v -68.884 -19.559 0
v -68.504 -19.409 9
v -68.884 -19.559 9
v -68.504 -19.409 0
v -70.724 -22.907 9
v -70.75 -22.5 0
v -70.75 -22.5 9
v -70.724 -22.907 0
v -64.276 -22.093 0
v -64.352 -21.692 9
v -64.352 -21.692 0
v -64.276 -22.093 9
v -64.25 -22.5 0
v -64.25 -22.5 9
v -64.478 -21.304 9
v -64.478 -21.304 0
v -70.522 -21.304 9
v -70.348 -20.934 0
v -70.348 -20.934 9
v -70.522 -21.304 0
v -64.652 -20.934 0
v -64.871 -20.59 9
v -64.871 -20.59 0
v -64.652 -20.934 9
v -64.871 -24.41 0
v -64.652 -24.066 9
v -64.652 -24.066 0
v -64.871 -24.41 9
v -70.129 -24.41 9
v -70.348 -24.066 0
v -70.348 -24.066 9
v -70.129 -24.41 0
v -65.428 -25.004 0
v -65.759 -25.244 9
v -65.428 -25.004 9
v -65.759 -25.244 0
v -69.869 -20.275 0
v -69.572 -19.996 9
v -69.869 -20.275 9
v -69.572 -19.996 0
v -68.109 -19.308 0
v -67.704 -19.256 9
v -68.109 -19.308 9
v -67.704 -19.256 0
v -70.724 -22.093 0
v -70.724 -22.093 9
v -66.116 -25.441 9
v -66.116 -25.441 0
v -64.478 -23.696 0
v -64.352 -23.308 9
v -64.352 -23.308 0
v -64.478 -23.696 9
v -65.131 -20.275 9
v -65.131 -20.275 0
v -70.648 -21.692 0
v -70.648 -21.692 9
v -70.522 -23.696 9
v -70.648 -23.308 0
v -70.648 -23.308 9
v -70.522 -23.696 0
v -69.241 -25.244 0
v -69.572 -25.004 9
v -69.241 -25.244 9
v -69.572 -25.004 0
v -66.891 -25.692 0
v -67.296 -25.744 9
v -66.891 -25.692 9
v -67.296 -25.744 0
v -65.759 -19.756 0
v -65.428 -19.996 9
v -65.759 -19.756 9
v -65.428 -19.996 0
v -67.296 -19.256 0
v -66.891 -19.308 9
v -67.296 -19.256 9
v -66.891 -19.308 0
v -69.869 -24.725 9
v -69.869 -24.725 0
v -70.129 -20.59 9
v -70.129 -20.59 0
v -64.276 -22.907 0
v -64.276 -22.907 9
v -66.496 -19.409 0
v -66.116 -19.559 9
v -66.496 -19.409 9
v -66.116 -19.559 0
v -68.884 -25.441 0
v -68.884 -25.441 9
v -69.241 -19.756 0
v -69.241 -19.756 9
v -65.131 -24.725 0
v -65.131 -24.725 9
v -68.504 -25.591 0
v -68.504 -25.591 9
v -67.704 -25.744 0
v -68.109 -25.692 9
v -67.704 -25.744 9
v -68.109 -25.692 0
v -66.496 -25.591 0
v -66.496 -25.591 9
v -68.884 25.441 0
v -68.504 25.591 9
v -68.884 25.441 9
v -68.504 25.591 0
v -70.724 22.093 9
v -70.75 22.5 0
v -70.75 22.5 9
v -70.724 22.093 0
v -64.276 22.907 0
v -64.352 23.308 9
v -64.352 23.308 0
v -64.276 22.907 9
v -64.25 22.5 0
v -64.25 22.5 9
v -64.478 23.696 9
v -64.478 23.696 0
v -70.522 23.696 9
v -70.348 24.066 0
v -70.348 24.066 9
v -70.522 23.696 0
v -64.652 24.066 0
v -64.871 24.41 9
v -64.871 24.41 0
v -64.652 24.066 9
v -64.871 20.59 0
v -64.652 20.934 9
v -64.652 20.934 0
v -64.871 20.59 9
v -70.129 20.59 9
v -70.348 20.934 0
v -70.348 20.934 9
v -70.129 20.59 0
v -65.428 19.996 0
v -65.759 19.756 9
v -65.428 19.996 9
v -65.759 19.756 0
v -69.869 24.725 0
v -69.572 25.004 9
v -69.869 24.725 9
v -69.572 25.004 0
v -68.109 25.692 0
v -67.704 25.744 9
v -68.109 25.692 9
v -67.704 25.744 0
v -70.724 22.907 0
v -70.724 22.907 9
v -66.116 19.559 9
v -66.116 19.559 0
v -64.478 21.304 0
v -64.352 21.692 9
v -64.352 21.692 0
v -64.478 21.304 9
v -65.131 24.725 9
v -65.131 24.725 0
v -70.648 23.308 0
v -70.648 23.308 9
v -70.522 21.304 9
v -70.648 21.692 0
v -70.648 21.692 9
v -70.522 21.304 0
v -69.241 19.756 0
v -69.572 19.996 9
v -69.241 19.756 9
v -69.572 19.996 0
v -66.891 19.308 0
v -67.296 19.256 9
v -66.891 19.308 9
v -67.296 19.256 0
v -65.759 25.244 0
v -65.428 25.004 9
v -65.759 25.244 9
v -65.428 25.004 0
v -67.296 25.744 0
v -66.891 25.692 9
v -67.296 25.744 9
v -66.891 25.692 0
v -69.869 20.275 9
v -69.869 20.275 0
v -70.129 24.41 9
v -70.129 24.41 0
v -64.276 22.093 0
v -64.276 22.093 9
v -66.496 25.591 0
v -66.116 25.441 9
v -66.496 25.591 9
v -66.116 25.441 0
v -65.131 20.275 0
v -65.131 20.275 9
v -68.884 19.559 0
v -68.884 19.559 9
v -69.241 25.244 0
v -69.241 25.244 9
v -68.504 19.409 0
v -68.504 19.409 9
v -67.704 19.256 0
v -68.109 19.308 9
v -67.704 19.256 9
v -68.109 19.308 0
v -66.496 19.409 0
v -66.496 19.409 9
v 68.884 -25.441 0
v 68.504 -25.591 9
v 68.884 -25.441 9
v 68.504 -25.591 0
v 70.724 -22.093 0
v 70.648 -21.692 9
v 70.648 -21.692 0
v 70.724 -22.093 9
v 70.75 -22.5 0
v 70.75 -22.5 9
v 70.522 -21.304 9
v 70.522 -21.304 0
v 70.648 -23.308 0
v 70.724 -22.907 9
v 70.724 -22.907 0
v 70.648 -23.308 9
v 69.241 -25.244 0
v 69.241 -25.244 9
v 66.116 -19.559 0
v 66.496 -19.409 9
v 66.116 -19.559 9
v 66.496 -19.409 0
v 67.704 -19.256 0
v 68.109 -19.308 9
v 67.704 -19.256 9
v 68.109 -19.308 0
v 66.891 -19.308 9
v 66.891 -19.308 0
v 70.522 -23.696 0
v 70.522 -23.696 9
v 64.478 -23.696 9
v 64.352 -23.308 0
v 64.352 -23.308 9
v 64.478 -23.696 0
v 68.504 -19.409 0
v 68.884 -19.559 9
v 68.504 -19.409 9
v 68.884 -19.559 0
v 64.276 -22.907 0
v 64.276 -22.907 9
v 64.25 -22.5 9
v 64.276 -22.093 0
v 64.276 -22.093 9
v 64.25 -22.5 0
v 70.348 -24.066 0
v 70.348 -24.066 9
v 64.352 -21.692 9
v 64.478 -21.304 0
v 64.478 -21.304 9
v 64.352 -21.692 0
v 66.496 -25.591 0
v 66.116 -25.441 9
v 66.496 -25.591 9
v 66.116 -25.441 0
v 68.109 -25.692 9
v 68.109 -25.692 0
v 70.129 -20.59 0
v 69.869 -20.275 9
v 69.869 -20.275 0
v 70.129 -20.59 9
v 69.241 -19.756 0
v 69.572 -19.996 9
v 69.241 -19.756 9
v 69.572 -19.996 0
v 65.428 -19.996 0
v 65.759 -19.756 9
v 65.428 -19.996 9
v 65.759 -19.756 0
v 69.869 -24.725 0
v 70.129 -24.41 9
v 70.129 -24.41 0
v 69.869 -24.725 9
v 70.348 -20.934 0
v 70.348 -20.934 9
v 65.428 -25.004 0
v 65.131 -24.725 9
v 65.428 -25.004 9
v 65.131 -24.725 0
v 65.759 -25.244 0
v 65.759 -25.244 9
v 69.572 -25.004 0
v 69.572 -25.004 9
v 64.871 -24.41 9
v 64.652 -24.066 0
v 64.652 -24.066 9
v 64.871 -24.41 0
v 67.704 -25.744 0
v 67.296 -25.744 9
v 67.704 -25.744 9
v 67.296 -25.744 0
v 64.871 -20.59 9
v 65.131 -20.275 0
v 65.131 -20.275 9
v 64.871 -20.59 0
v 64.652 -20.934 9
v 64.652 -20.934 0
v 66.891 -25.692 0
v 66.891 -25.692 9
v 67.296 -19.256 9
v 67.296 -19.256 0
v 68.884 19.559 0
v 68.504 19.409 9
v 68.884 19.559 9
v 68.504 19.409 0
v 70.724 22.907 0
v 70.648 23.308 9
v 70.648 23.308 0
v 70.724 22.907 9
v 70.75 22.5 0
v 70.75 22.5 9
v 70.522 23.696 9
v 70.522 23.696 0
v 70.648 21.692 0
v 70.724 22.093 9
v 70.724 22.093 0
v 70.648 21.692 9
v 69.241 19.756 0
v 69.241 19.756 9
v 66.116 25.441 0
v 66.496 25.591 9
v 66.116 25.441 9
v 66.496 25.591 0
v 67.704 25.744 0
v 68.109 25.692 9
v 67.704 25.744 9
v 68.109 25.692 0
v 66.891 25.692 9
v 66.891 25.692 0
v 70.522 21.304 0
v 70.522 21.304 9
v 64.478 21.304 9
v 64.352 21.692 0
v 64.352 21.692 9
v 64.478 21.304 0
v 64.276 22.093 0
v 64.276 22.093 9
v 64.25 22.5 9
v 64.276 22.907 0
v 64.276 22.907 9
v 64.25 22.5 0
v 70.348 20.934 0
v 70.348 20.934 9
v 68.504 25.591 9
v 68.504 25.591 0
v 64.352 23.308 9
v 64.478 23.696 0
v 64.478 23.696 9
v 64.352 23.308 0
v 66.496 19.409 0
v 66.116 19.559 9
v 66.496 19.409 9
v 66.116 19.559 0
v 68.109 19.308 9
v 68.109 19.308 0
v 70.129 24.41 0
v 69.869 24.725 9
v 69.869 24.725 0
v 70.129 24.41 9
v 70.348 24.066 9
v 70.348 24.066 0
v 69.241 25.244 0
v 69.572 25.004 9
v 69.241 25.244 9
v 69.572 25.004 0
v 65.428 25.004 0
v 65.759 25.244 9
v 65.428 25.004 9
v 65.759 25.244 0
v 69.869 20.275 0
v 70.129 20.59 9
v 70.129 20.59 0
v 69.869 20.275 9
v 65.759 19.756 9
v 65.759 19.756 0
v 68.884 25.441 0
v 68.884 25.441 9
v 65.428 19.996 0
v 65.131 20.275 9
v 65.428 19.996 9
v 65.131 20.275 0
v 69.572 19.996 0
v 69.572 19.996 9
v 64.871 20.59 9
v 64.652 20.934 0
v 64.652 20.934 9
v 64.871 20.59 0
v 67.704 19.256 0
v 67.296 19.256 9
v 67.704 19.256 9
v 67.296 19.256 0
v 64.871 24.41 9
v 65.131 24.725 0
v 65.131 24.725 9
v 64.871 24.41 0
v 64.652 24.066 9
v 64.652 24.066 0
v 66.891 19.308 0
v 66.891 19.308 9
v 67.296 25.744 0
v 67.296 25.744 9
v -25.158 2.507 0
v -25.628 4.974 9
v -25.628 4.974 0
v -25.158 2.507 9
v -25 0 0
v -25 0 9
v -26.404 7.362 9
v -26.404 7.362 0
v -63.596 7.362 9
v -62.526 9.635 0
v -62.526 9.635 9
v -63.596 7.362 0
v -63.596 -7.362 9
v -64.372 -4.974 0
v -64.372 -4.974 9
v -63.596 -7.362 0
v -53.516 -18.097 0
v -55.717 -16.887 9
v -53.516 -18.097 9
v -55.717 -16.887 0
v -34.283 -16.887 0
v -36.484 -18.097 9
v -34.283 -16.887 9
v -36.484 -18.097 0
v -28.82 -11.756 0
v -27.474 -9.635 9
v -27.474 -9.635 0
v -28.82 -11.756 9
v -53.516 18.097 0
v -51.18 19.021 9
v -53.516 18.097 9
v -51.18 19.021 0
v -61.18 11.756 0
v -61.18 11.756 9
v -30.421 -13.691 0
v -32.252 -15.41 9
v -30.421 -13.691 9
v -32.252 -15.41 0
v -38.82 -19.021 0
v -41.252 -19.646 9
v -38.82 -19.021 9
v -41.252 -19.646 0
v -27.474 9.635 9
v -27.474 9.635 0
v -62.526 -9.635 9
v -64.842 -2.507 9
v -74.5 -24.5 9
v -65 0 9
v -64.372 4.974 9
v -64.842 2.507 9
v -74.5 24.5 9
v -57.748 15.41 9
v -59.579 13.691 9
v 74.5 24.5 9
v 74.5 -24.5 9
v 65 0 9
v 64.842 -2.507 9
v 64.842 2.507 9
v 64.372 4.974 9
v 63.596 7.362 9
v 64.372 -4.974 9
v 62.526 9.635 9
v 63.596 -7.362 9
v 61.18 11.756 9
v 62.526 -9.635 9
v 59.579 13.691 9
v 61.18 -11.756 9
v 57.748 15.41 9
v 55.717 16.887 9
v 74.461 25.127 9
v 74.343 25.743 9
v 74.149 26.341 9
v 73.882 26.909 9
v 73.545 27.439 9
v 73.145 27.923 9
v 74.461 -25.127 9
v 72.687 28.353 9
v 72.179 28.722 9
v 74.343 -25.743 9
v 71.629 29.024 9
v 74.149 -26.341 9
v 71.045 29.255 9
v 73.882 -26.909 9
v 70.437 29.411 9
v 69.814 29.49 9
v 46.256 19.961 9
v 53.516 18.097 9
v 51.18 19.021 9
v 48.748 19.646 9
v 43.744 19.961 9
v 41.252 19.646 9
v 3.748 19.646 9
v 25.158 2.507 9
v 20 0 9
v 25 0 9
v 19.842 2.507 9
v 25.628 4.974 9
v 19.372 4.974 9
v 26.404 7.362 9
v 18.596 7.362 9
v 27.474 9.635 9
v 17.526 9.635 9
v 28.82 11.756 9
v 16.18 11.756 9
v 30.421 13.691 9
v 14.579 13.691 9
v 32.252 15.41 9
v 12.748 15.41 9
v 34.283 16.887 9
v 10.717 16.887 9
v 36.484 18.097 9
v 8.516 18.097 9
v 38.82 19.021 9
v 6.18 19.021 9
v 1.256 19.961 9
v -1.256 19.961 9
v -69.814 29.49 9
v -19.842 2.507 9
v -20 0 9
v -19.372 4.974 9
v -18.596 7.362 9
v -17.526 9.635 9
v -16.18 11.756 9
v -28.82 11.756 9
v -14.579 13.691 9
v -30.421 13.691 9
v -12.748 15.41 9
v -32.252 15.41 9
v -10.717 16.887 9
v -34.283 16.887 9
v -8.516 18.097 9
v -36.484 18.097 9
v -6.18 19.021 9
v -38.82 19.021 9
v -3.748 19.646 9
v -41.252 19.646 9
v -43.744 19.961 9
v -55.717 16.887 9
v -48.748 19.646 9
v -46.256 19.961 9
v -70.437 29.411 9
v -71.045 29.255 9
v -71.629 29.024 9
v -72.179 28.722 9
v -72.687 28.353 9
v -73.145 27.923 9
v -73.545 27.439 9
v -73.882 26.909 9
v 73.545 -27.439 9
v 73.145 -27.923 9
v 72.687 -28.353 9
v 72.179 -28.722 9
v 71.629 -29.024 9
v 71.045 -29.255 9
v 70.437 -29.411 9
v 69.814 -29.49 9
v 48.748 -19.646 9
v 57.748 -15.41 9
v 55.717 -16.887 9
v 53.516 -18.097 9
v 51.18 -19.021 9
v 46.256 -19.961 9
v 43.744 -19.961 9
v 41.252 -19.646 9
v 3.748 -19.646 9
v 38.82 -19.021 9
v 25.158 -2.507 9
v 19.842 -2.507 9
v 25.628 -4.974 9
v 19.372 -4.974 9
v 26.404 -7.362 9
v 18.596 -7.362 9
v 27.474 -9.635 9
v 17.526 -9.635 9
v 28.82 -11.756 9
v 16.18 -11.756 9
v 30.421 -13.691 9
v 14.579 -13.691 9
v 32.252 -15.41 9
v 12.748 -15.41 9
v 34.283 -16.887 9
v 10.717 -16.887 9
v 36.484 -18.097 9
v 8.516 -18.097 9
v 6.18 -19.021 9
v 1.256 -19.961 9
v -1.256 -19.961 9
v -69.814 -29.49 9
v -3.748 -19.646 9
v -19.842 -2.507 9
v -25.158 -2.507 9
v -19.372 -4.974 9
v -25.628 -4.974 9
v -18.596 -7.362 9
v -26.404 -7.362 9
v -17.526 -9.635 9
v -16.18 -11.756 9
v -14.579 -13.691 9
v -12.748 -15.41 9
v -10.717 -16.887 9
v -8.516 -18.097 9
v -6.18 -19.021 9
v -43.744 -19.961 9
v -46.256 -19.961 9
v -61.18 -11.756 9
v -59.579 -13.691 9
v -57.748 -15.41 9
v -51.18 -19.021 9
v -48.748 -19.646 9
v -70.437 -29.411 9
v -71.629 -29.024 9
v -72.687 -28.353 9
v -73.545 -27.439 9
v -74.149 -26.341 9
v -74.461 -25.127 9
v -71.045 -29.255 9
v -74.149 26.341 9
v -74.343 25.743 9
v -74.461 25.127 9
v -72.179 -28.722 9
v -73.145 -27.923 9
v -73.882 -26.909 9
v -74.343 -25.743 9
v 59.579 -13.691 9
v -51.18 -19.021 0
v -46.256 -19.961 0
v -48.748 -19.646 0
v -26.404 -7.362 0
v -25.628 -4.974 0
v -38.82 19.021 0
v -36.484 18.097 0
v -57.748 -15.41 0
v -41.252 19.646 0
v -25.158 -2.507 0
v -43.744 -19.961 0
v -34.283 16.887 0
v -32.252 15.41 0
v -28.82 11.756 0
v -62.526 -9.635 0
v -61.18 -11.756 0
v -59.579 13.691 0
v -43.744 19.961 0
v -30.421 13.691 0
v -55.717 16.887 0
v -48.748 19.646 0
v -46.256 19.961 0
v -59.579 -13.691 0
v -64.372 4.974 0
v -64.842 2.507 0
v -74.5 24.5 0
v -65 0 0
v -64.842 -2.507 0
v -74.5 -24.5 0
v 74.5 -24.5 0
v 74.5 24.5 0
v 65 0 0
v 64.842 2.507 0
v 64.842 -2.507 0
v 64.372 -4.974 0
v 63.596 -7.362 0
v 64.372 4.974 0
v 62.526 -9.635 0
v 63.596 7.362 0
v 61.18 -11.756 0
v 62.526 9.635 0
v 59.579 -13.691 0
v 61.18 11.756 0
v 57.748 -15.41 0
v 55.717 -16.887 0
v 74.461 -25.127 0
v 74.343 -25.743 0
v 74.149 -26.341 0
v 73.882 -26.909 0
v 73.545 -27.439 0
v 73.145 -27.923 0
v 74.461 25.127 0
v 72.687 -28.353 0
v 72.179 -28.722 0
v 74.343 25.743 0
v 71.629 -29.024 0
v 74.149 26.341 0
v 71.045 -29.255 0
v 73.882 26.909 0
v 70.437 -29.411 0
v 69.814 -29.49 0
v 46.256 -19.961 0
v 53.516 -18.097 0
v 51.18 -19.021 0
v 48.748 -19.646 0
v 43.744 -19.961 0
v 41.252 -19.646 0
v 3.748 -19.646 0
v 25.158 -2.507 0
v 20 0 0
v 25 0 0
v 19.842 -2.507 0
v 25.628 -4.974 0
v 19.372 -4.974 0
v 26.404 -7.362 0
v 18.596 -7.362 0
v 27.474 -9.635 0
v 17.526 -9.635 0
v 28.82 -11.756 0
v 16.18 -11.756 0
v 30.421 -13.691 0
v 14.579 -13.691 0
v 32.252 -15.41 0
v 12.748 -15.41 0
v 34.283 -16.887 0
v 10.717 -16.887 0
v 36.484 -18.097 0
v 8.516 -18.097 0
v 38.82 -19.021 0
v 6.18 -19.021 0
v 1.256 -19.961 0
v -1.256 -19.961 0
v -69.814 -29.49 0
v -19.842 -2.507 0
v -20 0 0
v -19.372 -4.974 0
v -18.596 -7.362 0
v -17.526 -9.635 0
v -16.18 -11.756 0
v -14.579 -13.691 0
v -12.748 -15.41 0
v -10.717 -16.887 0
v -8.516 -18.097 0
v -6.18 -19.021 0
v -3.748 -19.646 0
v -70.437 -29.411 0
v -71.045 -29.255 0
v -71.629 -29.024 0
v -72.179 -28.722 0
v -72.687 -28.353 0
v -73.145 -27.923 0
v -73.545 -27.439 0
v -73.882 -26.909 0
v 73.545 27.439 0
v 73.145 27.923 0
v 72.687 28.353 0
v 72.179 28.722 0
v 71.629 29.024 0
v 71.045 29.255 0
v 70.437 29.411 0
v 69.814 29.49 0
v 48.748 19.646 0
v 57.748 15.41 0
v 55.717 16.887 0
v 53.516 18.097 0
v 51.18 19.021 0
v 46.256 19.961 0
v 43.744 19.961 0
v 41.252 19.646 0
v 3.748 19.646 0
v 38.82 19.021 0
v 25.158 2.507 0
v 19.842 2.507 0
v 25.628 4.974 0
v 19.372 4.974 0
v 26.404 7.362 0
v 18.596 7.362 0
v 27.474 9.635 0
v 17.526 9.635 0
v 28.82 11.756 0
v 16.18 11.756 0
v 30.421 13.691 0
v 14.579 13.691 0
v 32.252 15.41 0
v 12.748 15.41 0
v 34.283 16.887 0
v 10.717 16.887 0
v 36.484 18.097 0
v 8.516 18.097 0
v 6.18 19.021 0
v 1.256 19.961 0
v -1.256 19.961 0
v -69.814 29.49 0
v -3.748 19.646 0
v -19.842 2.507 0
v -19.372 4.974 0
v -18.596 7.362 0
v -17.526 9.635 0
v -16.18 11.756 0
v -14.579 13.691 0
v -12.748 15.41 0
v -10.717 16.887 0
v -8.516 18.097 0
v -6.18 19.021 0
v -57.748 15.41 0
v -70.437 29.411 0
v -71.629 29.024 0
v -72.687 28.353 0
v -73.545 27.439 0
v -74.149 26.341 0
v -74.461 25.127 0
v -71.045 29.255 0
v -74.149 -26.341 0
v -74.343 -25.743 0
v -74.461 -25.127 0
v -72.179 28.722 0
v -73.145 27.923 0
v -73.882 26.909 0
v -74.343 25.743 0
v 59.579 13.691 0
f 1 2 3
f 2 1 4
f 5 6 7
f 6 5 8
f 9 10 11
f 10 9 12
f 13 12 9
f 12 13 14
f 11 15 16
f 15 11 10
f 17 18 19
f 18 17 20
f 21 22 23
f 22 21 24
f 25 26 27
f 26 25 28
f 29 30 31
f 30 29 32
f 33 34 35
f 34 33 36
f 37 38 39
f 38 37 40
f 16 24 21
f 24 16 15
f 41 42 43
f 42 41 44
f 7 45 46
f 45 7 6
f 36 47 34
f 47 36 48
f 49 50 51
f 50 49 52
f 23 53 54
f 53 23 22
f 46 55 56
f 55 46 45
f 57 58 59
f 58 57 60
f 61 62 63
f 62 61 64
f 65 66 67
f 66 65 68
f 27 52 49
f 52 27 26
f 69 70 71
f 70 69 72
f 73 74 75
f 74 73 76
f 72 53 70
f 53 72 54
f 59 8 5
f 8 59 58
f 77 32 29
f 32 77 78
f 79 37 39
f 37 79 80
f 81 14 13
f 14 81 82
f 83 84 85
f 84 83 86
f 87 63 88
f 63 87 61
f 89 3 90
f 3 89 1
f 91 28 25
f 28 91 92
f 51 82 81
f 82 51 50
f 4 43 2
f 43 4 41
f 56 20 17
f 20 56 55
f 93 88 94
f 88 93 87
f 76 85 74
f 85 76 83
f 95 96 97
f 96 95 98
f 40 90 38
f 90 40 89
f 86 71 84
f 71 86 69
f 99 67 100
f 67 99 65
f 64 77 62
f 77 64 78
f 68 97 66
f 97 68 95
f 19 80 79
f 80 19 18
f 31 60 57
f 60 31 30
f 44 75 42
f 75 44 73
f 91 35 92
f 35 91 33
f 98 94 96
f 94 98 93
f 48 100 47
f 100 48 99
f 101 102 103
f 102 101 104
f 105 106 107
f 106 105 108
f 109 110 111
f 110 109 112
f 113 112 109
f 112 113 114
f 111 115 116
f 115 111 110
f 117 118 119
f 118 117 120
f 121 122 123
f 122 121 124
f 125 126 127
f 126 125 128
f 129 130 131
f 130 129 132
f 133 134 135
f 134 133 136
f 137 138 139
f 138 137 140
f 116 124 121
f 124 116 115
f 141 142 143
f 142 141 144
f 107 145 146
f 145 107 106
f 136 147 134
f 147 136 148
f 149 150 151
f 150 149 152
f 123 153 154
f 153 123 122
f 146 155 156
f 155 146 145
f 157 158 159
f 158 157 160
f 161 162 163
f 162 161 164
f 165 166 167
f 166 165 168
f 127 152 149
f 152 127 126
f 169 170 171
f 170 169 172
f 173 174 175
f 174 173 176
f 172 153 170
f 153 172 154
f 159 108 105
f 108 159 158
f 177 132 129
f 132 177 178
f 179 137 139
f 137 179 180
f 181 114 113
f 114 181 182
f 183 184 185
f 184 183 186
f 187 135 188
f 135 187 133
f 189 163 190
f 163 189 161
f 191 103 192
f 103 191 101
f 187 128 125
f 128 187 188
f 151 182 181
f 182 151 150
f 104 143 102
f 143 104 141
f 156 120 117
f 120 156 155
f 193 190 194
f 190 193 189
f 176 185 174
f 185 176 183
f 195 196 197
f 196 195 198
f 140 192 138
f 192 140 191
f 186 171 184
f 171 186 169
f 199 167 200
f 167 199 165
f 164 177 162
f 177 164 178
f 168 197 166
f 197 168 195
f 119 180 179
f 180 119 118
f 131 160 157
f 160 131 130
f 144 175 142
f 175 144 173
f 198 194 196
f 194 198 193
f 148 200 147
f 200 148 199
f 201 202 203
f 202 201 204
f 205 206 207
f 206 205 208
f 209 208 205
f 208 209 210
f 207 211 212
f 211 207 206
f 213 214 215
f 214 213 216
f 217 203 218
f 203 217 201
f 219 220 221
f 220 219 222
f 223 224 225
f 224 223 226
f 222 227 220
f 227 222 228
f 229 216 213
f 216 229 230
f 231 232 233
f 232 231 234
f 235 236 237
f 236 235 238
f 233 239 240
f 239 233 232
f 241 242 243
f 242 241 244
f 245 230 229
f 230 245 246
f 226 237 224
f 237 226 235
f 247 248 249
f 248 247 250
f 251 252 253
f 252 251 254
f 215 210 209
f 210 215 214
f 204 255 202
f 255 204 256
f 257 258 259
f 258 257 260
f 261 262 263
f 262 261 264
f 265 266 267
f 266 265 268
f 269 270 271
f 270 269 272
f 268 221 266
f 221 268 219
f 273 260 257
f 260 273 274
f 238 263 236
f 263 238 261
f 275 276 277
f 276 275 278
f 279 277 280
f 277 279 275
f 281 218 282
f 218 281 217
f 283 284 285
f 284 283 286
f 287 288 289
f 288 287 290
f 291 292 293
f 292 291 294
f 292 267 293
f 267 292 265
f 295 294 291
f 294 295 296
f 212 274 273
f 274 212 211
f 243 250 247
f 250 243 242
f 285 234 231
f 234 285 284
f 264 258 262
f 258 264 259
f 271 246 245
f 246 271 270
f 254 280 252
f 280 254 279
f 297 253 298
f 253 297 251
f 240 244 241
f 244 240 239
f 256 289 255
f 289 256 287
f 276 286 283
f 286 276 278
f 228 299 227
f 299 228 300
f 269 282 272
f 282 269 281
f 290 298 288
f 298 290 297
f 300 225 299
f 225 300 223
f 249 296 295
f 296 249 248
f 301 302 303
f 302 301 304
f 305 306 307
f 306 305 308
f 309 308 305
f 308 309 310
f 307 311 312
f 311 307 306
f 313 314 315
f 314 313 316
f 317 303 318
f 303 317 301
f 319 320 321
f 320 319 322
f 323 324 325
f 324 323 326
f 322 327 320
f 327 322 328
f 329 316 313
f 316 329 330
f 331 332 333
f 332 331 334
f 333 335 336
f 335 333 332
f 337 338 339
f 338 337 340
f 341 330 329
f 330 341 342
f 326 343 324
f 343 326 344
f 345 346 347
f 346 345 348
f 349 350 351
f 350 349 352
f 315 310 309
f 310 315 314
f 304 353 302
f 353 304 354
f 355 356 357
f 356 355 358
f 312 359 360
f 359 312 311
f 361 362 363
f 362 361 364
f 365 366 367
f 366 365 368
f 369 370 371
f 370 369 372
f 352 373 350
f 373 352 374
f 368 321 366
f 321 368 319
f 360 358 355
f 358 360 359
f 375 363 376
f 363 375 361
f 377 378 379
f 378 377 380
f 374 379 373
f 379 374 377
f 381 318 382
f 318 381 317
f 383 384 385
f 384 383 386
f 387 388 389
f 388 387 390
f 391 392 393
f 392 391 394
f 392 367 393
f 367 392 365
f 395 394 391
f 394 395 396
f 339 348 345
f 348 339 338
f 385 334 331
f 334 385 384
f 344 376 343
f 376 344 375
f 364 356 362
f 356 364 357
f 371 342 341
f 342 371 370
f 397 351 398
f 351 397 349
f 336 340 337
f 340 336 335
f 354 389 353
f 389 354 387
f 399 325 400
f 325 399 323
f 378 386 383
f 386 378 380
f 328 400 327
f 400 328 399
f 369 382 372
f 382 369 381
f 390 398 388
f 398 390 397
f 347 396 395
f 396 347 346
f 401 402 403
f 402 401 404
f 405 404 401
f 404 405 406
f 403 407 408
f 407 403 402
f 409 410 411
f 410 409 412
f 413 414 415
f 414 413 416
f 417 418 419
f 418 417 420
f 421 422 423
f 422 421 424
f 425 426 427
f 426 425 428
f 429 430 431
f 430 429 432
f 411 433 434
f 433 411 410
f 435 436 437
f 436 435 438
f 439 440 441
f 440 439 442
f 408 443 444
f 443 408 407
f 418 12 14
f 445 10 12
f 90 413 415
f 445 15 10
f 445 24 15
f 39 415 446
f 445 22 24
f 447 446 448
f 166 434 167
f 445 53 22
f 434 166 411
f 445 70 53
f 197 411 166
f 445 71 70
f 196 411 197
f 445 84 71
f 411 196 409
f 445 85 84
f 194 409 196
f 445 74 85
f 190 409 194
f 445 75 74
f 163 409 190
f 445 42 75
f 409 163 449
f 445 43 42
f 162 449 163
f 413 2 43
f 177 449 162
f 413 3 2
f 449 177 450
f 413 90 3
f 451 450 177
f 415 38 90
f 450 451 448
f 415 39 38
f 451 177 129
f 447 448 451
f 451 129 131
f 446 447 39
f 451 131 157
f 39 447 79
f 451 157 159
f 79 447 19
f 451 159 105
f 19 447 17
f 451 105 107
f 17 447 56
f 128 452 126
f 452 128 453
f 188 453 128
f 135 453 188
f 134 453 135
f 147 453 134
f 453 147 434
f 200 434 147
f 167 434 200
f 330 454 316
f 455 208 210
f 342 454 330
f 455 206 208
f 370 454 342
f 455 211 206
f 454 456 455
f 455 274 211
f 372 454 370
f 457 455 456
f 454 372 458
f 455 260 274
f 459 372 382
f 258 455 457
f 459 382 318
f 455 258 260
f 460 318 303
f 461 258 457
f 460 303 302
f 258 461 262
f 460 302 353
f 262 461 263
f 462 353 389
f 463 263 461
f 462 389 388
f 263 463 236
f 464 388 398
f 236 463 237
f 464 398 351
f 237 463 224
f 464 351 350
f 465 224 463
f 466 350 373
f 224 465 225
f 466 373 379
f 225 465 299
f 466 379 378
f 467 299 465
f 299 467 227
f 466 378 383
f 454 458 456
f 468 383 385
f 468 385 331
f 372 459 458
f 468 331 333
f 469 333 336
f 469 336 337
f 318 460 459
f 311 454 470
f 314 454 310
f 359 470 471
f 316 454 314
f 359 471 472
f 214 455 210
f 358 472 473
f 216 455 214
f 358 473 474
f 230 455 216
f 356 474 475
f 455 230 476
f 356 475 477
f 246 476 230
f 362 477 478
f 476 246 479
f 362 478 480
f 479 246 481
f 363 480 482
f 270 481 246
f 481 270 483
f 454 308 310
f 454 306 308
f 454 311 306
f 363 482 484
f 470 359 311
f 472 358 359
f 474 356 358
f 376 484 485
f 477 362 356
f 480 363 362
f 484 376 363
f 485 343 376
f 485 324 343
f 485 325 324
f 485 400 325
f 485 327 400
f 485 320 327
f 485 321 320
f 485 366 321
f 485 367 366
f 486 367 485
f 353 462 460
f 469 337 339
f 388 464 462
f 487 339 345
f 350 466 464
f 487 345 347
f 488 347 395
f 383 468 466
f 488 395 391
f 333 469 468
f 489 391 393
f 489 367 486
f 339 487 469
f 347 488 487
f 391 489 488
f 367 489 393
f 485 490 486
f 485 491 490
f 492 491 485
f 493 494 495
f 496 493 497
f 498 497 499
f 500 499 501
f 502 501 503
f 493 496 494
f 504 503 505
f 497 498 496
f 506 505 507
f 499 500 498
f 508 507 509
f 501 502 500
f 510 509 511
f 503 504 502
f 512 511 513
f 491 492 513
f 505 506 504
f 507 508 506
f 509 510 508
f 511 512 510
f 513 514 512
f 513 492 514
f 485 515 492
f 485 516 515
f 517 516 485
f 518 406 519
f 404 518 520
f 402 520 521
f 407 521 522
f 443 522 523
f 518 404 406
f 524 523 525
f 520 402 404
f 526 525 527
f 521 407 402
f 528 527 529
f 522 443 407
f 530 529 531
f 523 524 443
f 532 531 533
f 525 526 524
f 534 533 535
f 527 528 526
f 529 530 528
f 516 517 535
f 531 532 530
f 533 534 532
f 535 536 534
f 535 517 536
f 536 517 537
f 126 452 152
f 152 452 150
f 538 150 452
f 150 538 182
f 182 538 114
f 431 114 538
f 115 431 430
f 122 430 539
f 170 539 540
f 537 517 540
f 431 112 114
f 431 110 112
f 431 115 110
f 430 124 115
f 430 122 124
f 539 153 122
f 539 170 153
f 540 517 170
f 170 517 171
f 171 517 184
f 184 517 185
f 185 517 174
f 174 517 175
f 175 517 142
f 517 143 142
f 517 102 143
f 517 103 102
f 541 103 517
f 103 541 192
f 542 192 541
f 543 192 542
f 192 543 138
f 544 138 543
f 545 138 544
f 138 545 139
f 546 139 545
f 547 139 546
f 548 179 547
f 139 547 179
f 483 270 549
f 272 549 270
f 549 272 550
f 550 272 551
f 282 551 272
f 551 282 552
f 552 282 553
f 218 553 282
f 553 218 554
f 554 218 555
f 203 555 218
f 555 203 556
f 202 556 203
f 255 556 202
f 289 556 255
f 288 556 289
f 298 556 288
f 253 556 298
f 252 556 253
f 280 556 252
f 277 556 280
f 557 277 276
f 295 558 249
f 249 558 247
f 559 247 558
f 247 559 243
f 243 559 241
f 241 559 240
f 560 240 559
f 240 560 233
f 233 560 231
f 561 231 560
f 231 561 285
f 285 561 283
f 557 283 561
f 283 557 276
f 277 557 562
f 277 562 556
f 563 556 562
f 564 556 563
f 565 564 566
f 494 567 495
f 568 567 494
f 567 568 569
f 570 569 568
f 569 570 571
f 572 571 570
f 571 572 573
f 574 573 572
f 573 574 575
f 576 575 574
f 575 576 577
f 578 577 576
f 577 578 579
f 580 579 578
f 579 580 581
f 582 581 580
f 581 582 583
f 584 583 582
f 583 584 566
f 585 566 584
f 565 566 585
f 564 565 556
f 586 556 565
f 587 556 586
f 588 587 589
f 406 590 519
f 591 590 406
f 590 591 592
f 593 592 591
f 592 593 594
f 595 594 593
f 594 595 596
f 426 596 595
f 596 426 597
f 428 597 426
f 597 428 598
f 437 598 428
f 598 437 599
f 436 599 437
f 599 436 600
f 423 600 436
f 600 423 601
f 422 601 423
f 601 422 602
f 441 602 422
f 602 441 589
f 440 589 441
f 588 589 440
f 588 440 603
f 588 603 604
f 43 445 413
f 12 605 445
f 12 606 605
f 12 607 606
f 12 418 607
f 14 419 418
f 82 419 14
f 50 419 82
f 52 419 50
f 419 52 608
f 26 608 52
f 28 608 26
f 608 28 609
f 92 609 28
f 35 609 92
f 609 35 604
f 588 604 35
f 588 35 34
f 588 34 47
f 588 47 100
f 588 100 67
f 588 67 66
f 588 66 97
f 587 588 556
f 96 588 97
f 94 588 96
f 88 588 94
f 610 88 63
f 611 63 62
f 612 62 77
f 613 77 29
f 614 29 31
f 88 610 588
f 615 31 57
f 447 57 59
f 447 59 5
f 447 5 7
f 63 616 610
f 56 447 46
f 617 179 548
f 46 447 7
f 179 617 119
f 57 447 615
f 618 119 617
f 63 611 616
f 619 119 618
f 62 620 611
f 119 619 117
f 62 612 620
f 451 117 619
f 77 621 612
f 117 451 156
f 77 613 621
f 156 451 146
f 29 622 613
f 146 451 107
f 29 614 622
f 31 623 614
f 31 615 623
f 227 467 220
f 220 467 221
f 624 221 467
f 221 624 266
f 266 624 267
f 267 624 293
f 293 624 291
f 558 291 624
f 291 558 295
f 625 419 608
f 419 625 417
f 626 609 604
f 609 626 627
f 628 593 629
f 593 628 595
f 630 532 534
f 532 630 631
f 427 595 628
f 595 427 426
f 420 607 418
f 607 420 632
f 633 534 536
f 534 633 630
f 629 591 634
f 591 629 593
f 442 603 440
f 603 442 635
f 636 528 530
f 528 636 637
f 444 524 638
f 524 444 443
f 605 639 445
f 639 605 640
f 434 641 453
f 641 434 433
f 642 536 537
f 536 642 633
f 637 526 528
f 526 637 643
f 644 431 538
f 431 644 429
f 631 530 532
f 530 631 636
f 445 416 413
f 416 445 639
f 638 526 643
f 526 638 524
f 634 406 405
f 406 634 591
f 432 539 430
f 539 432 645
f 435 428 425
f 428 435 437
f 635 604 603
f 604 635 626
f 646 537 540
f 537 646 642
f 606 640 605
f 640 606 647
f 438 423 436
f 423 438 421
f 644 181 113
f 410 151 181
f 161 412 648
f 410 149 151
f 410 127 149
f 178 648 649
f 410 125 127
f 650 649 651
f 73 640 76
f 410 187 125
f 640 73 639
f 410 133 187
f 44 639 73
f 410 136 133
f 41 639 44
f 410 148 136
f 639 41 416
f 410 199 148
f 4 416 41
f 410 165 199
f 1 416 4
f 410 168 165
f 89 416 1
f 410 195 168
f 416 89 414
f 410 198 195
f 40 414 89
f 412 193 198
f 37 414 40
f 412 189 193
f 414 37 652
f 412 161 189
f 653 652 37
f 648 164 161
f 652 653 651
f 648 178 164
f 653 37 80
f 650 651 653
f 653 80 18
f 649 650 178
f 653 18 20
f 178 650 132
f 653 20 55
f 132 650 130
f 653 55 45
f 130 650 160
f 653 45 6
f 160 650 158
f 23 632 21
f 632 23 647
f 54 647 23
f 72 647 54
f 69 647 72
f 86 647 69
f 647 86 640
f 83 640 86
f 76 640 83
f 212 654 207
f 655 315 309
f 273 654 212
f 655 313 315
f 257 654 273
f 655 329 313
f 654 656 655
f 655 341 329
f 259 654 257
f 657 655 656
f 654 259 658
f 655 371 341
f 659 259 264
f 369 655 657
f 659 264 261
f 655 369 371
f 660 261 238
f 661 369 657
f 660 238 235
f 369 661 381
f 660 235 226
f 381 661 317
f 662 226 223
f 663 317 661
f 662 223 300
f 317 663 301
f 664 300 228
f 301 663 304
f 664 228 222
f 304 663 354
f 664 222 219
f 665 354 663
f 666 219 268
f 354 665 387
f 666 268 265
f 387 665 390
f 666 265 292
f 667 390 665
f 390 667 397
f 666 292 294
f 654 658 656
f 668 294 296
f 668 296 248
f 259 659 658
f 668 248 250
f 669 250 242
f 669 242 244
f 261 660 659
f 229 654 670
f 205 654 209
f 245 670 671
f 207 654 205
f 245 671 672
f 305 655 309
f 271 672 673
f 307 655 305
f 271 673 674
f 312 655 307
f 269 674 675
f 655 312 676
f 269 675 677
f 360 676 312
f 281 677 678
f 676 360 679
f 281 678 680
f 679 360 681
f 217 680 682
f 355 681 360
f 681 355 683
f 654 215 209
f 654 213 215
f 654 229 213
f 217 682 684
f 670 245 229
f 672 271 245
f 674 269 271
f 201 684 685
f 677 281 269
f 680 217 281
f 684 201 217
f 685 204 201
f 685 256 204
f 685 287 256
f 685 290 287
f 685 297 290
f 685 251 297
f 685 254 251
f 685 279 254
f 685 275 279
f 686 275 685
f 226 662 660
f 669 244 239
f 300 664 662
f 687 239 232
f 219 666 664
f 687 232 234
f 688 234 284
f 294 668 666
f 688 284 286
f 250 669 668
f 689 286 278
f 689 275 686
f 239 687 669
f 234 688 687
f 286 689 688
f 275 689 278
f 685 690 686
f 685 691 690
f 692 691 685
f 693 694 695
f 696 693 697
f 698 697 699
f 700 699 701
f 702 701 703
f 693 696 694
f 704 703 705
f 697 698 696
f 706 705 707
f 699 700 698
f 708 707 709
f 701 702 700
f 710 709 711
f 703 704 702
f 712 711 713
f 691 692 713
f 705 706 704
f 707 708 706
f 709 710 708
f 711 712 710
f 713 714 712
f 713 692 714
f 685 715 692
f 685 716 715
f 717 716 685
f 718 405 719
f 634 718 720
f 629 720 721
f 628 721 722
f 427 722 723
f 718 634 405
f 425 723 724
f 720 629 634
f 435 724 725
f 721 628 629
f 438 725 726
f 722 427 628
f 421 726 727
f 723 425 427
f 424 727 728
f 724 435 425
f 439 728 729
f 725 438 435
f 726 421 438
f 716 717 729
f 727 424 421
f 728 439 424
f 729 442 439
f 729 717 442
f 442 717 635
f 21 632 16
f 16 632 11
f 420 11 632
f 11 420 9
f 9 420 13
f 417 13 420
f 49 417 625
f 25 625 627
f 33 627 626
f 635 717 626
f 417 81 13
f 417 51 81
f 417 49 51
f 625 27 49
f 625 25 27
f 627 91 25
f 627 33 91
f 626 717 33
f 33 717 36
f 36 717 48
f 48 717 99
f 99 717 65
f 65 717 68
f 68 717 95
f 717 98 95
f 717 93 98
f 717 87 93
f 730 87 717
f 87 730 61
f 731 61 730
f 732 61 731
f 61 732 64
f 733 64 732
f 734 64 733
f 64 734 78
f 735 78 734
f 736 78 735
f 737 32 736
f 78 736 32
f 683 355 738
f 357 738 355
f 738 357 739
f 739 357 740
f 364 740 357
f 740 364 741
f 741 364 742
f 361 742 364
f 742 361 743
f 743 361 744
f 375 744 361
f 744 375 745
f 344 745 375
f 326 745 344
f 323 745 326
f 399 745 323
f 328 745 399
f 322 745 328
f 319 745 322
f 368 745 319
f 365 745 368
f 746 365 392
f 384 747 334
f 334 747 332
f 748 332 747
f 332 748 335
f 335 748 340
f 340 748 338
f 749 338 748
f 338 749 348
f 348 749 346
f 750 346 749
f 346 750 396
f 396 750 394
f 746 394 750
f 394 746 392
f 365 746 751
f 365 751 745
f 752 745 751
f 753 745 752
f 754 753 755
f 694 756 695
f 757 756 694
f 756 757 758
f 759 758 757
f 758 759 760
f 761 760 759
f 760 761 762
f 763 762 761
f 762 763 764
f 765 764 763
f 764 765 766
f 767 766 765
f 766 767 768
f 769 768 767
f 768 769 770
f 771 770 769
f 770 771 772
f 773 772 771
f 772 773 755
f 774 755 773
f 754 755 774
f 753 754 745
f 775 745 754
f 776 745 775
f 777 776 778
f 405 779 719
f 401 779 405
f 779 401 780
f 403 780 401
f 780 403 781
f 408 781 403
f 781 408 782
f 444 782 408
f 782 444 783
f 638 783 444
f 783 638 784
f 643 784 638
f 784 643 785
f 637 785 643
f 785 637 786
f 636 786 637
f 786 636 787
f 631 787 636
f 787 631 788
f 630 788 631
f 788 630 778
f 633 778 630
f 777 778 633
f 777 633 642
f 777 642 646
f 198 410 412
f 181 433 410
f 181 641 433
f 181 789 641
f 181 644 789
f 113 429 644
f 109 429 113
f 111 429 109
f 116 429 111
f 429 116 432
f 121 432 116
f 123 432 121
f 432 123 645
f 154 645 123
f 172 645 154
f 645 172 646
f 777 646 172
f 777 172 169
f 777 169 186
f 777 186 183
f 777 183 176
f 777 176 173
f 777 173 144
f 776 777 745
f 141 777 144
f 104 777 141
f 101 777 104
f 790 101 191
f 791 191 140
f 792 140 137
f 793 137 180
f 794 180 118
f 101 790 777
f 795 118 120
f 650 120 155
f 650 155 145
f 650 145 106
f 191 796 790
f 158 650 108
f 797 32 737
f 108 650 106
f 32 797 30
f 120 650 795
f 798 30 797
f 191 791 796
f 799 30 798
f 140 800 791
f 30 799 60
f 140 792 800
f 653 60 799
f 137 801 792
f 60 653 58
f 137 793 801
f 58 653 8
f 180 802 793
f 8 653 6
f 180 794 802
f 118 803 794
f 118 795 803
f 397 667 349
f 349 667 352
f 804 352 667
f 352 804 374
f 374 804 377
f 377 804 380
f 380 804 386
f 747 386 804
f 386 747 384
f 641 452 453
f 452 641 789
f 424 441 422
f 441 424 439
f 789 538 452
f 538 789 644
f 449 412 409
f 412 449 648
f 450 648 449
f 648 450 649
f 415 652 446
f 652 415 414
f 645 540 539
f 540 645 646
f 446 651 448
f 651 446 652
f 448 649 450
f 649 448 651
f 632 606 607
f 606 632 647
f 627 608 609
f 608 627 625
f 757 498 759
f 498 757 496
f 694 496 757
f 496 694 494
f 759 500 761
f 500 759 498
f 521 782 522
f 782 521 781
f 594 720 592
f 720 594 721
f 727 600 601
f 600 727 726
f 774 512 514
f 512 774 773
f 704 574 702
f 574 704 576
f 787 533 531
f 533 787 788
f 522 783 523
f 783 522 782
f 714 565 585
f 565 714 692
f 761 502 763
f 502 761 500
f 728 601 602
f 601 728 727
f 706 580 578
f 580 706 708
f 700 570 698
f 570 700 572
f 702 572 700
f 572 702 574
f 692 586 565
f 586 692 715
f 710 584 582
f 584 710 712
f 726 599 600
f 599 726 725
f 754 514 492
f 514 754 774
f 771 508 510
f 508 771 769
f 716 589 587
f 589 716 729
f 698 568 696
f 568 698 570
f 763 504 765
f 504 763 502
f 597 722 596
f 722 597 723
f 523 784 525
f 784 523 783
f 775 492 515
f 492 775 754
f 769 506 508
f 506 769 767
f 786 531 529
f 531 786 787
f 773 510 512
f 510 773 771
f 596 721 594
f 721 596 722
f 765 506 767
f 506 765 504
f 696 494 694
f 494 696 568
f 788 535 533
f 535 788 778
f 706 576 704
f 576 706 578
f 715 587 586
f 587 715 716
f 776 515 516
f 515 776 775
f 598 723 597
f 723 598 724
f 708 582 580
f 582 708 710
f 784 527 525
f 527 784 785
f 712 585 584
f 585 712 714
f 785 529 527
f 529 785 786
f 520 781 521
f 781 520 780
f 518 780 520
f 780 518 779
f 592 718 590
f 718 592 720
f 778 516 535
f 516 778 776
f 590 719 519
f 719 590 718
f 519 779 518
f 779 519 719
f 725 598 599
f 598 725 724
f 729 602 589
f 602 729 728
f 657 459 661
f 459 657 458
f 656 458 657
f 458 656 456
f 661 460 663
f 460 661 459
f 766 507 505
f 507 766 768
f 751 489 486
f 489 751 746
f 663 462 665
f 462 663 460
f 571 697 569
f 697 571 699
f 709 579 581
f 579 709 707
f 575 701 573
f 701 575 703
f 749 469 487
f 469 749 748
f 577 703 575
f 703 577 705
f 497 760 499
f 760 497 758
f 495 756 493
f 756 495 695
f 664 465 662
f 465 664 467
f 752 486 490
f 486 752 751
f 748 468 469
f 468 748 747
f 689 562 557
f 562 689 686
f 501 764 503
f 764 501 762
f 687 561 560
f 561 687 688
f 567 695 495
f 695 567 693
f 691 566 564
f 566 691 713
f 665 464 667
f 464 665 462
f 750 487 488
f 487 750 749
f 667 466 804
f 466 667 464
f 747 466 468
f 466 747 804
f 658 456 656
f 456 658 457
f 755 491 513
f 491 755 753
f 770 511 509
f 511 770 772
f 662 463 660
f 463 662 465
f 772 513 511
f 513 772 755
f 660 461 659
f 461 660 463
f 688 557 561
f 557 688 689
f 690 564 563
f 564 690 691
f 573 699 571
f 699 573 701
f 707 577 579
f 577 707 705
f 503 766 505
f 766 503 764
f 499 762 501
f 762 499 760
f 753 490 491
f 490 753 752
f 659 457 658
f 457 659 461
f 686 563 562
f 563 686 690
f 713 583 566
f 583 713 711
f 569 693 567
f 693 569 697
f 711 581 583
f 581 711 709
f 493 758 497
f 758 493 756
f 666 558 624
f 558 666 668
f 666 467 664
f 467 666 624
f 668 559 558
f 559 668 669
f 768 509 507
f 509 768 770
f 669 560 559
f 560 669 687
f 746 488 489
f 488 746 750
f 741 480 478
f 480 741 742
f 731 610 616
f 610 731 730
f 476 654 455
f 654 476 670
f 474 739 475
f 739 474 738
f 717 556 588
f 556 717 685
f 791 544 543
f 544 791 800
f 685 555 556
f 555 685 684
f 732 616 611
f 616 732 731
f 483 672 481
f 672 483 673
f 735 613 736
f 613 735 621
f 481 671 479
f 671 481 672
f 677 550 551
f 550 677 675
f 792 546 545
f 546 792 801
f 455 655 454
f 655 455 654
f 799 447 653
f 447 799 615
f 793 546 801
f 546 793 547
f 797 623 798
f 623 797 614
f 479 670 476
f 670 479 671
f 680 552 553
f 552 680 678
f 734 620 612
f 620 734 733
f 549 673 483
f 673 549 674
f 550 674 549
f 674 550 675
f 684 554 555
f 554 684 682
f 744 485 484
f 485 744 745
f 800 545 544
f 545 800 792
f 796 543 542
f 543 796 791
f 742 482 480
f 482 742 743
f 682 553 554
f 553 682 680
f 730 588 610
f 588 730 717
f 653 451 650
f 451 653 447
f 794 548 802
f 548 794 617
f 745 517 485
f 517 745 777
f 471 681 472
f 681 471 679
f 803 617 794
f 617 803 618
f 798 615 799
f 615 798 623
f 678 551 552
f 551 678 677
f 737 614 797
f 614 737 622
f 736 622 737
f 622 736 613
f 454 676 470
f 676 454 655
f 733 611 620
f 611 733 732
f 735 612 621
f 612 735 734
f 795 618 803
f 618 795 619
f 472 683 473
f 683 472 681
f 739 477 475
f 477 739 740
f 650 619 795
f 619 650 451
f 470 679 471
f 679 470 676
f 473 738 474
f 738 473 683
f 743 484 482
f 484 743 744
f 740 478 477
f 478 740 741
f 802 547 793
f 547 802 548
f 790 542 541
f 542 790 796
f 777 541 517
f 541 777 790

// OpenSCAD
$fn = 50;


difference() {
	union() {
		hull() {
			translate(v = [-69.5000000000, 24.5000000000, 0]) {
				cylinder(h = 9, r = 5);
			}
			translate(v = [69.5000000000, 24.5000000000, 0]) {
				cylinder(h = 9, r = 5);
			}
			translate(v = [-69.5000000000, -24.5000000000, 0]) {
				cylinder(h = 9, r = 5);
			}
			translate(v = [69.5000000000, -24.5000000000, 0]) {
				cylinder(h = 9, r = 5);
			}
		}
	}
	union() {
		#translate(v = [-67.5000000000, -22.5000000000, -100.0000000000]) {
			cylinder(h = 200, r = 3.2500000000);
		}
		#translate(v = [-67.5000000000, 22.5000000000, -100.0000000000]) {
			cylinder(h = 200, r = 3.2500000000);
		}
		#translate(v = [67.5000000000, -22.5000000000, -100.0000000000]) {
			cylinder(h = 200, r = 3.2500000000);
		}
		#translate(v = [67.5000000000, 22.5000000000, -100.0000000000]) {
			cylinder(h = 200, r = 3.2500000000);
		}
		#translate(v = [-45.0000000000, 0, 0]) {
			cylinder(h = 9, r = 20.0000000000);
		}
		#cylinder(h = 9, r = 20.0000000000);
		#translate(v = [45.0000000000, 0, 0]) {
			cylinder(h = 9, r = 20.0000000000);
		}
	}
}
